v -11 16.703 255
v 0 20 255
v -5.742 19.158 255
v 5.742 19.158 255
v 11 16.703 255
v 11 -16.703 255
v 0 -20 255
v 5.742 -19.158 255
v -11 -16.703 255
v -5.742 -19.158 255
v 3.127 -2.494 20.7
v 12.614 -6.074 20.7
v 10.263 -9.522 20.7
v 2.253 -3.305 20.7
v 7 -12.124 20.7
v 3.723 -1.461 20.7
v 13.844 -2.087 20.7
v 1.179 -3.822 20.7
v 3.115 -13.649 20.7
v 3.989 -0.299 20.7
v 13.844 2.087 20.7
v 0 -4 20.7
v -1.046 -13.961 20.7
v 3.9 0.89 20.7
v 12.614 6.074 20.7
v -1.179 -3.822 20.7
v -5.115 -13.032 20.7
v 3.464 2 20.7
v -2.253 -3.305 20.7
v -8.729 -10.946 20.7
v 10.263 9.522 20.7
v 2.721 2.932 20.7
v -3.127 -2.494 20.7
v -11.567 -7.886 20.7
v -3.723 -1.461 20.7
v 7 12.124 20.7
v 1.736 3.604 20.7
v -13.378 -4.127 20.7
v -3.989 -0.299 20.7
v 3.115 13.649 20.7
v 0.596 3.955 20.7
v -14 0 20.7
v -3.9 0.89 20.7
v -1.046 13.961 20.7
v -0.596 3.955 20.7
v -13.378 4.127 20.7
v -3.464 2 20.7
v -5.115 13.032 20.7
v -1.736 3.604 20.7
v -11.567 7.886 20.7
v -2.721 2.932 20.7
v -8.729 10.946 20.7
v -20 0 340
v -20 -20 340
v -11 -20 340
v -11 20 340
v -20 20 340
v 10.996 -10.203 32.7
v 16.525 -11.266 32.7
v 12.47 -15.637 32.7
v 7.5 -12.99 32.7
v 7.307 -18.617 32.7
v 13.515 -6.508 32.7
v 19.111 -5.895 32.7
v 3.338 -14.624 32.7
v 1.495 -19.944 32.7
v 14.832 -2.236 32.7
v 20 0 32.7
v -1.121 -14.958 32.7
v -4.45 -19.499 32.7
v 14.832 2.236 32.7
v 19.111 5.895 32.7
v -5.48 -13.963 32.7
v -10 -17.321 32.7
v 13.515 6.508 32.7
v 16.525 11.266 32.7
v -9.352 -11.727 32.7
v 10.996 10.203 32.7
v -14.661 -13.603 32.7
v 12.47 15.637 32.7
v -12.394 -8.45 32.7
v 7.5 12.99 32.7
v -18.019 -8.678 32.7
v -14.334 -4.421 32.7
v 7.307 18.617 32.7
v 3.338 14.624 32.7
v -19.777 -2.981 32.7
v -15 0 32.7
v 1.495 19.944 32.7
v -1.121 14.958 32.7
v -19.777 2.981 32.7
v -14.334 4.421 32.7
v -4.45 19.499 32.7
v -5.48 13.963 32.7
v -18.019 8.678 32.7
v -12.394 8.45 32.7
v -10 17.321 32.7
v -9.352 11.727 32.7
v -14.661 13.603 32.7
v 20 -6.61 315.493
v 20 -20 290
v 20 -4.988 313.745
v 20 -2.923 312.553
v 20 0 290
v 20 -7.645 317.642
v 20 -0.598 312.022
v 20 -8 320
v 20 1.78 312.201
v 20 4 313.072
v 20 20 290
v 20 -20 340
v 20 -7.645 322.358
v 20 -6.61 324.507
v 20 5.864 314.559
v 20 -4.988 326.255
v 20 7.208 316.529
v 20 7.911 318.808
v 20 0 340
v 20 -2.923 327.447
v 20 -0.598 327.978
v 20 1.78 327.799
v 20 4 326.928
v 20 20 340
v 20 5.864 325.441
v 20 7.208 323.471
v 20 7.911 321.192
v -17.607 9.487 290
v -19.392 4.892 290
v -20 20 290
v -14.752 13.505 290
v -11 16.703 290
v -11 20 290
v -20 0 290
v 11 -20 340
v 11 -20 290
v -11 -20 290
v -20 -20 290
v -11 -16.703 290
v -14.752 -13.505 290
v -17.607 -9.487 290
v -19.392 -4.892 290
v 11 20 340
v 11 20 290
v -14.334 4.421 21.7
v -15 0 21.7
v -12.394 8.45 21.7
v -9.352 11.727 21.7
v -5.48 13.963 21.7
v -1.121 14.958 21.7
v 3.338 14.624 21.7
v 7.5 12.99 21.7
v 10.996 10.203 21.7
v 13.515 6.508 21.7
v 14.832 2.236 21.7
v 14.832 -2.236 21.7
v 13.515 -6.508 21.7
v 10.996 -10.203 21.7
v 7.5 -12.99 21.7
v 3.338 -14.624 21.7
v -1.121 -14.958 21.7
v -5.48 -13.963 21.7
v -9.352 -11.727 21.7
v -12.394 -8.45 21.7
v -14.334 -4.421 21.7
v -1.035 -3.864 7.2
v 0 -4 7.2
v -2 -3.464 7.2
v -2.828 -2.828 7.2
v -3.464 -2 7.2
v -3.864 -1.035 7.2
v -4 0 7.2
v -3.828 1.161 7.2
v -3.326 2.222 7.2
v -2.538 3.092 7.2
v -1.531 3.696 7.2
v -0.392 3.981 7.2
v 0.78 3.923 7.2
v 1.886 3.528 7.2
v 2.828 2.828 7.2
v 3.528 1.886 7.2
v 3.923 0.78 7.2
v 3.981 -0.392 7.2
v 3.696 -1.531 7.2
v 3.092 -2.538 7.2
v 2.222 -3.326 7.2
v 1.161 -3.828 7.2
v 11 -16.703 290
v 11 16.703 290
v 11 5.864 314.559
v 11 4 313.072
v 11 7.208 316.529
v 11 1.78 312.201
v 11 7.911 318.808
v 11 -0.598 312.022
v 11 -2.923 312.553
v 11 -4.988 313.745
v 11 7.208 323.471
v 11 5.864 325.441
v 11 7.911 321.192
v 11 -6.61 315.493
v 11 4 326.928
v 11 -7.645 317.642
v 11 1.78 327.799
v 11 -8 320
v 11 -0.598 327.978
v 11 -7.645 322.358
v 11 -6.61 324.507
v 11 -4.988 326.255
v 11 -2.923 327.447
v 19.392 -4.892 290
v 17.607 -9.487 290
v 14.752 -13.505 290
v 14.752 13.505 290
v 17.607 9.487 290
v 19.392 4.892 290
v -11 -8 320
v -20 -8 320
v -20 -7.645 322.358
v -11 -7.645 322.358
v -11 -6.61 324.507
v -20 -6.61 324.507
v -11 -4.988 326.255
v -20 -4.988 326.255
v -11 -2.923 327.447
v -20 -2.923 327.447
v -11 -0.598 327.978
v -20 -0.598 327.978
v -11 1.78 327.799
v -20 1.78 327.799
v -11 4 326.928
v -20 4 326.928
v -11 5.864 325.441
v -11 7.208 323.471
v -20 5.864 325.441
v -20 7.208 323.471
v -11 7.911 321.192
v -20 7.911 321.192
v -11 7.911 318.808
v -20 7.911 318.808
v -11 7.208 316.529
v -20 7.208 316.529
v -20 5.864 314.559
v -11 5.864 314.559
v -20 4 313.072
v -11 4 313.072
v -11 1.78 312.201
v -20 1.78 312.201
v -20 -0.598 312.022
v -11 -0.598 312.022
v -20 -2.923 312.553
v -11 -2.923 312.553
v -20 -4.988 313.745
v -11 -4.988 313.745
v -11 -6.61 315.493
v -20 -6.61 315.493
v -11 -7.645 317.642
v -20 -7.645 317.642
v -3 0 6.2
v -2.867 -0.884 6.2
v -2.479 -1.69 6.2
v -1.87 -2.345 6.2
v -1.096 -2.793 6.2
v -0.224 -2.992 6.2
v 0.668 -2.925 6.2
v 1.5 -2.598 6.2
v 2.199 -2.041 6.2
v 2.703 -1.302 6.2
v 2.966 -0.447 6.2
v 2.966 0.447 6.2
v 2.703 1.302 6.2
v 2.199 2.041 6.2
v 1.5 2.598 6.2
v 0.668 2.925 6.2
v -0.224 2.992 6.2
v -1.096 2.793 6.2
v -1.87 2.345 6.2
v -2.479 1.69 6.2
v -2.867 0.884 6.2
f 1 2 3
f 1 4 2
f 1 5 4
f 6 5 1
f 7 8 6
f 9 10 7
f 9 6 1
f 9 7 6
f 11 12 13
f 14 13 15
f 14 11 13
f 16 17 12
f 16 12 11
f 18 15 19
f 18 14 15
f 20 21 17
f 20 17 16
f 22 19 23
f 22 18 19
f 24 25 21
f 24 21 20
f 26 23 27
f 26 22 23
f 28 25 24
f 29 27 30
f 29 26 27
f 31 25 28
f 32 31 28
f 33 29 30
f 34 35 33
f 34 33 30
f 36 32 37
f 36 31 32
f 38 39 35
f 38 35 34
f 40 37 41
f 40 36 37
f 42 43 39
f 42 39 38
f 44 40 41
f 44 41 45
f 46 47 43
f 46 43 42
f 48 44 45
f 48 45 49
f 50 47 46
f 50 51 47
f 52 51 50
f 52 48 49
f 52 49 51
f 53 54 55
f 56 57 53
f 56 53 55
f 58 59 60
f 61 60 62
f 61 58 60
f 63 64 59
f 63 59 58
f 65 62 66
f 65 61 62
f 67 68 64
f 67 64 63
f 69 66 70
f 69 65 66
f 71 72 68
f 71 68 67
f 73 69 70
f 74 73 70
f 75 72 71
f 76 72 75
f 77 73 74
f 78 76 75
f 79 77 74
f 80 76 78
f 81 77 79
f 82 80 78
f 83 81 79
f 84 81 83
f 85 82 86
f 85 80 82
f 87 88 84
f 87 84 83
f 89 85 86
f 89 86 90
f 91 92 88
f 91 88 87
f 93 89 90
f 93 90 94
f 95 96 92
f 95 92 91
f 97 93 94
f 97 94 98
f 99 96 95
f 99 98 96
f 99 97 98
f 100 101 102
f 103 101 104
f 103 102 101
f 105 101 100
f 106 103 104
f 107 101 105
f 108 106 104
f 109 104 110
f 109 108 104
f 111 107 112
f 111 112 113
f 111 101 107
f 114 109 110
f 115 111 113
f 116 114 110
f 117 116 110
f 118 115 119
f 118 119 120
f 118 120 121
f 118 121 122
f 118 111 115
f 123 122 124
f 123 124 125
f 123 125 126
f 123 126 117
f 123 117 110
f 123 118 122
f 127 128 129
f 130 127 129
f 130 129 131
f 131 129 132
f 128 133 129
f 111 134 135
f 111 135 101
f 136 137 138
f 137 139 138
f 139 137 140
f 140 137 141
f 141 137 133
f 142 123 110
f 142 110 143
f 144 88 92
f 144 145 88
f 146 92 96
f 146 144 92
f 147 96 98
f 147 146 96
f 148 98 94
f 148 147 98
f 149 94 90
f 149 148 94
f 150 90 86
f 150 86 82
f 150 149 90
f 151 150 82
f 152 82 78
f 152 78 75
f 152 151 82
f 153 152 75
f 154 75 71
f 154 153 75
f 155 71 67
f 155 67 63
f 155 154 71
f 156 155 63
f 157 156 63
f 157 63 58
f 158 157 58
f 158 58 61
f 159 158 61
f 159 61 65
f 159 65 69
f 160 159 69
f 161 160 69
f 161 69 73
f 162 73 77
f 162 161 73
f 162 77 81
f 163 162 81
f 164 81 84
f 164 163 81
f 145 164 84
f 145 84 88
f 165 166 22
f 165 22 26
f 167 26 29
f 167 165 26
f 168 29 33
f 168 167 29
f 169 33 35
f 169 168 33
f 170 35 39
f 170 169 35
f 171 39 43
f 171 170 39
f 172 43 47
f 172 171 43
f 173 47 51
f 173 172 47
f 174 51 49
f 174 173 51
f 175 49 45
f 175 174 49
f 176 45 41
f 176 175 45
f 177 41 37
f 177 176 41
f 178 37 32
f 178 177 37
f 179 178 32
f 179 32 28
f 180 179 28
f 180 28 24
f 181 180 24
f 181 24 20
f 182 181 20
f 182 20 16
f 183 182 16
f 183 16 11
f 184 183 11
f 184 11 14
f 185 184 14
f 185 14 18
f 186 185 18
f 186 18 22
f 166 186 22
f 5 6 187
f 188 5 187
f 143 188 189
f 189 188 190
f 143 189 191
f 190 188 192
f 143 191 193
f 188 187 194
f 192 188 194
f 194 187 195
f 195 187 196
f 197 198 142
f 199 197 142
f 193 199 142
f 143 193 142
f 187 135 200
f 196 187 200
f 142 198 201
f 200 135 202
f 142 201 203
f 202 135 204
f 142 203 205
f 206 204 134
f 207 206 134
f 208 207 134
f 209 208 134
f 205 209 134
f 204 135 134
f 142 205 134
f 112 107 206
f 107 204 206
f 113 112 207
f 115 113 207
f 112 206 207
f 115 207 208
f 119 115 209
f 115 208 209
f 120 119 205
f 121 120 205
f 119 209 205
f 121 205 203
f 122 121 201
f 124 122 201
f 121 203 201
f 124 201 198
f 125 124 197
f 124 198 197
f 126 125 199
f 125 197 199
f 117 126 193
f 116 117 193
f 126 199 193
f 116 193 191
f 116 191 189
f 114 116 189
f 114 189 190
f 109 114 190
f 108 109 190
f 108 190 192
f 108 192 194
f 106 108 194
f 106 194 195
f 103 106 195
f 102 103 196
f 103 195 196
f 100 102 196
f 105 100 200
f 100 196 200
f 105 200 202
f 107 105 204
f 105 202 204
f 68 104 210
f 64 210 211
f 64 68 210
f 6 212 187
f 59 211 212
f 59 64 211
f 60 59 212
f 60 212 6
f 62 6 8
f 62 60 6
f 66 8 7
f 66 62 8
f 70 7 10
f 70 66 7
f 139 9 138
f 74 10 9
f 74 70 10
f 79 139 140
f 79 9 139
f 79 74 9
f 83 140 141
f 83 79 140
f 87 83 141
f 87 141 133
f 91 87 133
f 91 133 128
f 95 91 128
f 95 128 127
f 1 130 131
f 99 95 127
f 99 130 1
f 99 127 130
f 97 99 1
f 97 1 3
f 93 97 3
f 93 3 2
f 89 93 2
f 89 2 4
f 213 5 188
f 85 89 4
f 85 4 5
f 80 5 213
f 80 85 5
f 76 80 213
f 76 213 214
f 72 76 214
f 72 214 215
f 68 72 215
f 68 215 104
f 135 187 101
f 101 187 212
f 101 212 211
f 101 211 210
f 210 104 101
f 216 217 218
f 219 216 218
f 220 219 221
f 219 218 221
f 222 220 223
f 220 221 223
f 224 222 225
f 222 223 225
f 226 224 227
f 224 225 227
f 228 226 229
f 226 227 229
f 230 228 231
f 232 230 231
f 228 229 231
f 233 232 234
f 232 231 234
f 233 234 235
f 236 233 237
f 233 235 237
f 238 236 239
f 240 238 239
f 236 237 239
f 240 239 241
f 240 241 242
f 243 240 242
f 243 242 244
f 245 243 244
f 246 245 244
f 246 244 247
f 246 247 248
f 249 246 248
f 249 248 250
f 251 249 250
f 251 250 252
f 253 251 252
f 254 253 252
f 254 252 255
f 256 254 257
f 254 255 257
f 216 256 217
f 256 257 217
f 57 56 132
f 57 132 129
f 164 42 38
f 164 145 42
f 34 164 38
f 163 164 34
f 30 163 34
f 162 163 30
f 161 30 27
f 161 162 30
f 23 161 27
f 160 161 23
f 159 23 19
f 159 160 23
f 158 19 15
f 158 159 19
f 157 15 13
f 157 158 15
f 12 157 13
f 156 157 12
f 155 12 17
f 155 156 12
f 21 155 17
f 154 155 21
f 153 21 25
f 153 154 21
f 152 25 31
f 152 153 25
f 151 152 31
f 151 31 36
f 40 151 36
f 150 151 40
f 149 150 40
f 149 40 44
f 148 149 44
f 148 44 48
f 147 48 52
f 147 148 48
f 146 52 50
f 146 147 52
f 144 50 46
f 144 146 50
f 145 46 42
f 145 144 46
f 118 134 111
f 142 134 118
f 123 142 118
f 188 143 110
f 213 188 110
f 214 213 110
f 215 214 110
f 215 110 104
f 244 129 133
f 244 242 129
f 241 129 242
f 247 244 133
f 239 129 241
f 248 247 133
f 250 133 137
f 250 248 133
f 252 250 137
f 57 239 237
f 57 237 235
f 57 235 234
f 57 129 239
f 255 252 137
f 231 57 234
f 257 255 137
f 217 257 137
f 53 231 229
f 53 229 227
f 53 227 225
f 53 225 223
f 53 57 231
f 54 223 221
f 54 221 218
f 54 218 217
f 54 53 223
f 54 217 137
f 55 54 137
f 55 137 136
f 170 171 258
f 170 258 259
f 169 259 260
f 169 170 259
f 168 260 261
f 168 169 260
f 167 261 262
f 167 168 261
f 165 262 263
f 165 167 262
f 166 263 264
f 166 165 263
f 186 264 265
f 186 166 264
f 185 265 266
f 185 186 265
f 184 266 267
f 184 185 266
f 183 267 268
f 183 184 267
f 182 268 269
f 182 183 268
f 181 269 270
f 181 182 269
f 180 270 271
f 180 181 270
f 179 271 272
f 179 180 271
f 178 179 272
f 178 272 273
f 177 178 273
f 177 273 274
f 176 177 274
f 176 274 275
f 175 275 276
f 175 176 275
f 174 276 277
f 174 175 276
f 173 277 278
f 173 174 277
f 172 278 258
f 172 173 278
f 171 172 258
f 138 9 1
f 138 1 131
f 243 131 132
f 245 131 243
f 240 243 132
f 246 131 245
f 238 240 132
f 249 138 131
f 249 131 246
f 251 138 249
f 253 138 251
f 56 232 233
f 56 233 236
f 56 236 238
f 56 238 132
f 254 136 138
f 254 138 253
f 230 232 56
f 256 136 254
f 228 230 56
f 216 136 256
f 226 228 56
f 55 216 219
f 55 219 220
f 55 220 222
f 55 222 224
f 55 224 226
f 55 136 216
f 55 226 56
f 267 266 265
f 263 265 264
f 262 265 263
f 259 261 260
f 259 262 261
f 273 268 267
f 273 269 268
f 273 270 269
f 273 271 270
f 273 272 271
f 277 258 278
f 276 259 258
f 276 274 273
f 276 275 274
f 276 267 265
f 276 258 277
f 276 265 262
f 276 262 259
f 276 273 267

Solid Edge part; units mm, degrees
sketch "Sketch1" plane through (0, 0, 0) normal (0, 0, 1) x (1, 0, 0)
  circle A0 centre (0, 0) radius 20
extrude "Protrusion1" add sketch "Sketch1" along normal blind 340
sketch "Sketch2" plane through (0, 0, 0) normal (0, 0, -1) x (-1, 0, 0)
  circle A0 centre (0, 0) radius 15
  circle A1 centre (0, 0) radius 20
extrude "ExtrudedCutout_12" cut sketch "Sketch2" against normal blind 32.7
sketch "Sketch3" plane through (0, 0, 0) normal (0, 0, -1) x (0, -1, 0)
  circle A0 centre (0, 0) radius 4
  circle A1 centre (0, 0) radius 15
extrude "ExtrudedCutout_13" cut sketch "Sketch3" against normal blind 20.7
sketch "Sketch4" plane through (0, 0, 0) normal (0, 0, -1) x (0, -1, 0)
  circle A0 centre (0, 0) radius 4
extrude "ExtrudedCutout_14" cut sketch "Sketch4" against normal blind 6.2
cosmetic_thread "Thread1" size "Tr 8 x 2"
sketch "Sketch5" plane through (0, 0, 0) normal (0, 1, 0) x (-1, 0, 0)
  line L0 (3, 6.2) -> (4, 7.2)
  line L1 (4, 7.2) -> (4, 6.2)
  line L2 (4, 6.2) -> (3, 6.2)
  line L3 (14, 20.7) -> (15, 20.7)
  line L4 (15, 20.7) -> (15, 21.7)
  line L5 (15, 21.7) -> (14, 20.7)
revolve "RevolvedCutout1" cut sketch "Sketch5" angle 360 about axis through (0, 0, 0) along (0, 0, 1)
sketch "Sketch6" plane through (20, 0, 315) normal (1, 0, 0) x (0, 1, 0)
  circle A0 centre (0, 5) radius 11
extrude "Cutout1" cut sketch "Sketch6" against normal blind 1
sketch "Sketch7" plane through (-20, 0, 315) normal (-1, 0, 0) x (0, -1, 0)
  circle A0 centre (0, 5) radius 11
extrude "ExtrudedCutout_19" cut sketch "Sketch7" against normal blind 1
sketch "Sketch8" plane through (15.5, 0, 340) normal (0, 0, 1) x (0, -1, 0)
  line L0 (-20, -35.5) -> (20, -35.5)
  line L1 (20, -35.5) -> (20, 4.5)
  line L2 (20, 4.5) -> (-20, 4.5)
  line L3 (-20, 4.5) -> (-20, -35.5)
extrude "ExtrudedCutout_21" add sketch "Sketch8" against normal blind 50
sketch "Sketch9" plane through (10, 0.0037, 292.5417) normal (-1, 0, 0) x (0, -1, 0)
  circle A0 centre (0.0037, 27.4583) radius 8
extrude "ExtrudedCutout_5" cut sketch "Sketch9" along normal mid plane 178.997
sketch "Sketch10" plane through (0, -20, 315) normal (0, -1, 0) x (0, 0, -1)
  line L0 (60, 11) -> (-25, 11)
  line L1 (-25, -11) -> (-25, 11)
  line L2 (60, -11) -> (-25, -11)
  line L3 (60, 11) -> (60, -11)
extrude "ExtrudedCutout_20" cut sketch "Sketch10" against normal blind 40
properties material "Steel - Stainless:1.4301 , X5CrNi18-10"
